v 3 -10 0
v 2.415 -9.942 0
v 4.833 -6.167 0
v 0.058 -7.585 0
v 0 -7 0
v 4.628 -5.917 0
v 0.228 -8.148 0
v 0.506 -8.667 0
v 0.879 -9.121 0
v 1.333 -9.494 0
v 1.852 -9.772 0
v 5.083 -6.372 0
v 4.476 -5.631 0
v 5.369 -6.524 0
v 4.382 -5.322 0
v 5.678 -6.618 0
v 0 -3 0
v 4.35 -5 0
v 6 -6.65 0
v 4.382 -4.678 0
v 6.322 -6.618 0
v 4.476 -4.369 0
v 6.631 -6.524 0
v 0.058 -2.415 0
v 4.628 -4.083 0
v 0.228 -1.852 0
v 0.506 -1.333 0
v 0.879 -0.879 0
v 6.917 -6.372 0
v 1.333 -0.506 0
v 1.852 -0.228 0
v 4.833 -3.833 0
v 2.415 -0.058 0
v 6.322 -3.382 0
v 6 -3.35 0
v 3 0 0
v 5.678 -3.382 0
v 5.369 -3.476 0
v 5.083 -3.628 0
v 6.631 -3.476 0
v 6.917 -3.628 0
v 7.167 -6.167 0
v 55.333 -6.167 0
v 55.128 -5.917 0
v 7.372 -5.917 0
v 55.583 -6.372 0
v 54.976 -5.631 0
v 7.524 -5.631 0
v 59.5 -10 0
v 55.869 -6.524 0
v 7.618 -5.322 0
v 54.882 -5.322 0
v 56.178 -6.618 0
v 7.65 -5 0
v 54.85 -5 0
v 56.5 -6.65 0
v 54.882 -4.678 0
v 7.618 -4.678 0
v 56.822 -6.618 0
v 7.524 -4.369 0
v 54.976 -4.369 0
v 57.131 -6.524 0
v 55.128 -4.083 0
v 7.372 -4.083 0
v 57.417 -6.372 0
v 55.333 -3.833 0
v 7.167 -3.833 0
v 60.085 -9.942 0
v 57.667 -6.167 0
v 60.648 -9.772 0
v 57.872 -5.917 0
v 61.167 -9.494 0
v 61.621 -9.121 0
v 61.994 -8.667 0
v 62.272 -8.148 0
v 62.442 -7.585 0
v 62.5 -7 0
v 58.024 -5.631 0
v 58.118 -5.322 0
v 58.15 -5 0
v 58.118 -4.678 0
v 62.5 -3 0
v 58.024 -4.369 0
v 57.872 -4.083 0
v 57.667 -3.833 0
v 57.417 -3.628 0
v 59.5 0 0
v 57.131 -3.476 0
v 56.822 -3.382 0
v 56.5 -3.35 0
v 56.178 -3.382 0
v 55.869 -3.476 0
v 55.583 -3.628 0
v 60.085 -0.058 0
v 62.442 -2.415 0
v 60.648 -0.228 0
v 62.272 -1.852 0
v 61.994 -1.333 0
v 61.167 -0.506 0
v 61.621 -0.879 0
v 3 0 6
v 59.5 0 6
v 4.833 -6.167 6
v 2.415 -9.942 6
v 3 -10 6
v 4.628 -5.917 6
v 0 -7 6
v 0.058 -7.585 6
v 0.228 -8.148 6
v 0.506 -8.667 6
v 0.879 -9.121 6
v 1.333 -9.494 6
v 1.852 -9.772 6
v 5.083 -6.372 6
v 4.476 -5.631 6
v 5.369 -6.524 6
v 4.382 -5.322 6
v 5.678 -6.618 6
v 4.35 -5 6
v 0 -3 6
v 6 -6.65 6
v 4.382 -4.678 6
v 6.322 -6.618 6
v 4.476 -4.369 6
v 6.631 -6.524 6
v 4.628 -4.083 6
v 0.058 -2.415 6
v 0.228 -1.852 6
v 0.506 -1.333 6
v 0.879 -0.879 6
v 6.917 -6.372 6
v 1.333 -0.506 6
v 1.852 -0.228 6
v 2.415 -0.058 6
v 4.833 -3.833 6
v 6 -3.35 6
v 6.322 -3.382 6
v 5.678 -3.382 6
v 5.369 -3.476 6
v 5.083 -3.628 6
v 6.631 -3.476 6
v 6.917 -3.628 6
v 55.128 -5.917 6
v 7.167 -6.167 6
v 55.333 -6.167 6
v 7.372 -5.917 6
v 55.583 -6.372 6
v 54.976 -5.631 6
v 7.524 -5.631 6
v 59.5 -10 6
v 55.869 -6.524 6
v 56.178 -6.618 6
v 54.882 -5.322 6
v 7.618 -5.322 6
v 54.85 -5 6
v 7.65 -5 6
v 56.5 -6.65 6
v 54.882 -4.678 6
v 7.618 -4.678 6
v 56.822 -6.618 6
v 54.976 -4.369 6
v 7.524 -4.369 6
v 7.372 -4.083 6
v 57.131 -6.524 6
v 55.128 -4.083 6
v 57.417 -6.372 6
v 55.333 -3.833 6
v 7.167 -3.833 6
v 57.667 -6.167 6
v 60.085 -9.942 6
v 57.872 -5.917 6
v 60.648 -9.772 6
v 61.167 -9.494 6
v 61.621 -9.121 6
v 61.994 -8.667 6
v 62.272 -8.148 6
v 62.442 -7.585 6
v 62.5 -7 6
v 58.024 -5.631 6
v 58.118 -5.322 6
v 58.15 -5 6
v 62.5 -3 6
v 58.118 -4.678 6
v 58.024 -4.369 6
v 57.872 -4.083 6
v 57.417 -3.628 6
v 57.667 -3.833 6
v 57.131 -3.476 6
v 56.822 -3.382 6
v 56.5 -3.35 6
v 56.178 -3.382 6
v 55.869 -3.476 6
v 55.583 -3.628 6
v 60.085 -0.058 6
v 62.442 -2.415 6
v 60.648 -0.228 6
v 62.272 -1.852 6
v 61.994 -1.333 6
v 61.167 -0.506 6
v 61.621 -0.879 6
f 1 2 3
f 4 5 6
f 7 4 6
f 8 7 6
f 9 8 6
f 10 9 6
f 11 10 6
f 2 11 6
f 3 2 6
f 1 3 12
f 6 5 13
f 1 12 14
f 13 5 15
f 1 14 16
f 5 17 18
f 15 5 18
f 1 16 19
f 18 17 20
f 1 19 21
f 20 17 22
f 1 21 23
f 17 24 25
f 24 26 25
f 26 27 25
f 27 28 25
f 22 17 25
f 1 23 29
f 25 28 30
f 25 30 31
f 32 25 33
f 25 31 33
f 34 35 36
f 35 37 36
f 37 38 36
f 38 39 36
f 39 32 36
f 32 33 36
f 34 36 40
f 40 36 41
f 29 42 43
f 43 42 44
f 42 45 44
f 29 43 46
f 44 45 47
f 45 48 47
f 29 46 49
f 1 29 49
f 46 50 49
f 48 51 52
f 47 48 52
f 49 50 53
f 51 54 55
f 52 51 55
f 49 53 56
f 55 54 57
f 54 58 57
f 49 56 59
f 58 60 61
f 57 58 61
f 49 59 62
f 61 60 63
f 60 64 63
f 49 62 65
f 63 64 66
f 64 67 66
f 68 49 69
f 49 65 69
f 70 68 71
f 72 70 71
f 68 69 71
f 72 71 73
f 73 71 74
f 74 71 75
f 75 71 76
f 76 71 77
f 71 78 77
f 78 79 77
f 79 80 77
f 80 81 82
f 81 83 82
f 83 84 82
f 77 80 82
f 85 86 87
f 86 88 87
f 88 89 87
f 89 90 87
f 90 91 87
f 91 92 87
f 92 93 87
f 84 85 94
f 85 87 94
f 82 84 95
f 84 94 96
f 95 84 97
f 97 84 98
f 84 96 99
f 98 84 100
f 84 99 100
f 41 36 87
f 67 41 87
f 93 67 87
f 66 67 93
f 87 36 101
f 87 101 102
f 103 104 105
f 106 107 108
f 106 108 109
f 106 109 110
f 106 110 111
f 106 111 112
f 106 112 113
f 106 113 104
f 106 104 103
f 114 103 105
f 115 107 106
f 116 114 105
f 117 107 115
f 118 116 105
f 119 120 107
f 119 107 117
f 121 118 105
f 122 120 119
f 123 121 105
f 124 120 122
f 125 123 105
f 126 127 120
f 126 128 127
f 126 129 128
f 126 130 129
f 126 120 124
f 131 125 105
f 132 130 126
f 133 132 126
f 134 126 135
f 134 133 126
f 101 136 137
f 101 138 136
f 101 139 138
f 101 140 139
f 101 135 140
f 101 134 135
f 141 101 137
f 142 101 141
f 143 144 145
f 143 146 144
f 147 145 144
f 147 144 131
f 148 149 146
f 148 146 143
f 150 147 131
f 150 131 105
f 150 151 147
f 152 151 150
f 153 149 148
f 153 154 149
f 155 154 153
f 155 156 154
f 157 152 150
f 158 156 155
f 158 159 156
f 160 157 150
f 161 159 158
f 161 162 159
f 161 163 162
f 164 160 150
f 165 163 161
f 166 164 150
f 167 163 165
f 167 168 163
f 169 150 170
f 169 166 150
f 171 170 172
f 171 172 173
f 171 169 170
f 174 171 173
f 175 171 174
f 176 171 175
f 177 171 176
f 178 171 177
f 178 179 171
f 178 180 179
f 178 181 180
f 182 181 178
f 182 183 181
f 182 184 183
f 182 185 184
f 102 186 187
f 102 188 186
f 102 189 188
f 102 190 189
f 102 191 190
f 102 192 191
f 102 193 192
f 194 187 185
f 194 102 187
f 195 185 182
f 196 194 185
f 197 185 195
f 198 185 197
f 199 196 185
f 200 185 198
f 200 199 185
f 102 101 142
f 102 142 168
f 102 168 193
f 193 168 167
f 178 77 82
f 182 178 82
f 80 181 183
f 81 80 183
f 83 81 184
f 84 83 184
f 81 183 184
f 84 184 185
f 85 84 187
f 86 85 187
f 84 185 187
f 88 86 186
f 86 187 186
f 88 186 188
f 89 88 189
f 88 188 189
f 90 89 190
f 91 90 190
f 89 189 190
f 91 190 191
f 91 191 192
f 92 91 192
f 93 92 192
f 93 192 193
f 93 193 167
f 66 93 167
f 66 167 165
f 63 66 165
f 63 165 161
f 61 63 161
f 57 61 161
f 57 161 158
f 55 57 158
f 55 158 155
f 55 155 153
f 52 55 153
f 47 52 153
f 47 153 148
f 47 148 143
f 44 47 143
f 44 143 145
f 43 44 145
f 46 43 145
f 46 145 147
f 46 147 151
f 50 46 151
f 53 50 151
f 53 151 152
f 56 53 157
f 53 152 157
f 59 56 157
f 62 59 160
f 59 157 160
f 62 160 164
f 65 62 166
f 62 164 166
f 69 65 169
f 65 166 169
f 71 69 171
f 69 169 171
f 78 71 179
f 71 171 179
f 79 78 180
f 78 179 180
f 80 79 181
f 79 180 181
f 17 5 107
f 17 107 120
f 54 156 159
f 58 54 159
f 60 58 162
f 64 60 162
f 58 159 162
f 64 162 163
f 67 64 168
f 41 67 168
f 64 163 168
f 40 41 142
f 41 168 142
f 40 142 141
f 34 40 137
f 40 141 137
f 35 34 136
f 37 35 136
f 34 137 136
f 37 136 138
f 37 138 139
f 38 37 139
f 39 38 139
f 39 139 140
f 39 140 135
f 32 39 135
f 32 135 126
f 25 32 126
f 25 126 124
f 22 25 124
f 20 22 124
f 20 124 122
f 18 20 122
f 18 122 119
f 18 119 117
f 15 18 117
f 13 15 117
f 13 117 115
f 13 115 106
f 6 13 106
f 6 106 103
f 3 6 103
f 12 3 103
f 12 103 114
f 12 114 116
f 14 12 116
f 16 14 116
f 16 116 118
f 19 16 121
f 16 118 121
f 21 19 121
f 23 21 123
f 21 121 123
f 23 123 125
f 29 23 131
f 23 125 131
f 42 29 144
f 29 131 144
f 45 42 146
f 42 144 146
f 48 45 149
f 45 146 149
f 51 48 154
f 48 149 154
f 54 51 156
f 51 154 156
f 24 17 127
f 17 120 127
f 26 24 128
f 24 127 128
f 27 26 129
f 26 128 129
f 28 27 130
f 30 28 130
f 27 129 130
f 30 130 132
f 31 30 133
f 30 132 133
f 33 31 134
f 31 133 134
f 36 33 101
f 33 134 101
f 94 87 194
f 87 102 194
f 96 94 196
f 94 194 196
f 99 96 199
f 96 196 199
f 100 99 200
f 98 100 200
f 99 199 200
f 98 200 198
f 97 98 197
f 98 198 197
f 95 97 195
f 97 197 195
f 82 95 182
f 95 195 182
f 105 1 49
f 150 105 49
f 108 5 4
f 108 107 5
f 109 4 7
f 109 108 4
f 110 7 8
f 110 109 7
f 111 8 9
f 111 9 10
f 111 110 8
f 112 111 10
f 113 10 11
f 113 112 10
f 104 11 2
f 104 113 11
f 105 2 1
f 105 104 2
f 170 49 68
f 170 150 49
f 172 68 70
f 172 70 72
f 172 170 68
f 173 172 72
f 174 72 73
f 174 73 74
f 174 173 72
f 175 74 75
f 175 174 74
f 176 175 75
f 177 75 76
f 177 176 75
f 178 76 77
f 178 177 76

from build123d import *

# Parameters (mm, degrees)
SKETCH1_W           = 62.5
SKETCH1_H           = 10
BOSS_EXTRUDE1_DEPTH = 6
SKETCH2_R           = 1.65
CUT_EXTRUDE1_DEPTH  = 64.578691399
FILLET1_R           = 3


with BuildPart() as part:
    # Sketch1 → Boss-Extrude1 (new body)
    with BuildSketch(Plane.XY):
        with Locations((31.25, -5)):
            Rectangle(SKETCH1_W, SKETCH1_H)
    extrude(amount=BOSS_EXTRUDE1_DEPTH)

    # Sketch2 → Cut-Extrude1 (cut, through all)
    with BuildSketch(Plane.XY.offset(6)):
        with Locations((56.5, -5)):
            Circle(SKETCH2_R)
        with Locations((6, -5)):
            Circle(SKETCH2_R)
    extrude(amount=-CUT_EXTRUDE1_DEPTH, mode=Mode.SUBTRACT)

    # Fillet1
    fillet1_edges = [part.edges().sort_by_distance(p)[0] for p in [
        (0, 0, 3),
        (62.5, 0, 3),
        (62.5, -10, 3),
        (0, -10, 3),
    ]]
    fillet(fillet1_edges, radius=FILLET1_R)


solid = part.part
